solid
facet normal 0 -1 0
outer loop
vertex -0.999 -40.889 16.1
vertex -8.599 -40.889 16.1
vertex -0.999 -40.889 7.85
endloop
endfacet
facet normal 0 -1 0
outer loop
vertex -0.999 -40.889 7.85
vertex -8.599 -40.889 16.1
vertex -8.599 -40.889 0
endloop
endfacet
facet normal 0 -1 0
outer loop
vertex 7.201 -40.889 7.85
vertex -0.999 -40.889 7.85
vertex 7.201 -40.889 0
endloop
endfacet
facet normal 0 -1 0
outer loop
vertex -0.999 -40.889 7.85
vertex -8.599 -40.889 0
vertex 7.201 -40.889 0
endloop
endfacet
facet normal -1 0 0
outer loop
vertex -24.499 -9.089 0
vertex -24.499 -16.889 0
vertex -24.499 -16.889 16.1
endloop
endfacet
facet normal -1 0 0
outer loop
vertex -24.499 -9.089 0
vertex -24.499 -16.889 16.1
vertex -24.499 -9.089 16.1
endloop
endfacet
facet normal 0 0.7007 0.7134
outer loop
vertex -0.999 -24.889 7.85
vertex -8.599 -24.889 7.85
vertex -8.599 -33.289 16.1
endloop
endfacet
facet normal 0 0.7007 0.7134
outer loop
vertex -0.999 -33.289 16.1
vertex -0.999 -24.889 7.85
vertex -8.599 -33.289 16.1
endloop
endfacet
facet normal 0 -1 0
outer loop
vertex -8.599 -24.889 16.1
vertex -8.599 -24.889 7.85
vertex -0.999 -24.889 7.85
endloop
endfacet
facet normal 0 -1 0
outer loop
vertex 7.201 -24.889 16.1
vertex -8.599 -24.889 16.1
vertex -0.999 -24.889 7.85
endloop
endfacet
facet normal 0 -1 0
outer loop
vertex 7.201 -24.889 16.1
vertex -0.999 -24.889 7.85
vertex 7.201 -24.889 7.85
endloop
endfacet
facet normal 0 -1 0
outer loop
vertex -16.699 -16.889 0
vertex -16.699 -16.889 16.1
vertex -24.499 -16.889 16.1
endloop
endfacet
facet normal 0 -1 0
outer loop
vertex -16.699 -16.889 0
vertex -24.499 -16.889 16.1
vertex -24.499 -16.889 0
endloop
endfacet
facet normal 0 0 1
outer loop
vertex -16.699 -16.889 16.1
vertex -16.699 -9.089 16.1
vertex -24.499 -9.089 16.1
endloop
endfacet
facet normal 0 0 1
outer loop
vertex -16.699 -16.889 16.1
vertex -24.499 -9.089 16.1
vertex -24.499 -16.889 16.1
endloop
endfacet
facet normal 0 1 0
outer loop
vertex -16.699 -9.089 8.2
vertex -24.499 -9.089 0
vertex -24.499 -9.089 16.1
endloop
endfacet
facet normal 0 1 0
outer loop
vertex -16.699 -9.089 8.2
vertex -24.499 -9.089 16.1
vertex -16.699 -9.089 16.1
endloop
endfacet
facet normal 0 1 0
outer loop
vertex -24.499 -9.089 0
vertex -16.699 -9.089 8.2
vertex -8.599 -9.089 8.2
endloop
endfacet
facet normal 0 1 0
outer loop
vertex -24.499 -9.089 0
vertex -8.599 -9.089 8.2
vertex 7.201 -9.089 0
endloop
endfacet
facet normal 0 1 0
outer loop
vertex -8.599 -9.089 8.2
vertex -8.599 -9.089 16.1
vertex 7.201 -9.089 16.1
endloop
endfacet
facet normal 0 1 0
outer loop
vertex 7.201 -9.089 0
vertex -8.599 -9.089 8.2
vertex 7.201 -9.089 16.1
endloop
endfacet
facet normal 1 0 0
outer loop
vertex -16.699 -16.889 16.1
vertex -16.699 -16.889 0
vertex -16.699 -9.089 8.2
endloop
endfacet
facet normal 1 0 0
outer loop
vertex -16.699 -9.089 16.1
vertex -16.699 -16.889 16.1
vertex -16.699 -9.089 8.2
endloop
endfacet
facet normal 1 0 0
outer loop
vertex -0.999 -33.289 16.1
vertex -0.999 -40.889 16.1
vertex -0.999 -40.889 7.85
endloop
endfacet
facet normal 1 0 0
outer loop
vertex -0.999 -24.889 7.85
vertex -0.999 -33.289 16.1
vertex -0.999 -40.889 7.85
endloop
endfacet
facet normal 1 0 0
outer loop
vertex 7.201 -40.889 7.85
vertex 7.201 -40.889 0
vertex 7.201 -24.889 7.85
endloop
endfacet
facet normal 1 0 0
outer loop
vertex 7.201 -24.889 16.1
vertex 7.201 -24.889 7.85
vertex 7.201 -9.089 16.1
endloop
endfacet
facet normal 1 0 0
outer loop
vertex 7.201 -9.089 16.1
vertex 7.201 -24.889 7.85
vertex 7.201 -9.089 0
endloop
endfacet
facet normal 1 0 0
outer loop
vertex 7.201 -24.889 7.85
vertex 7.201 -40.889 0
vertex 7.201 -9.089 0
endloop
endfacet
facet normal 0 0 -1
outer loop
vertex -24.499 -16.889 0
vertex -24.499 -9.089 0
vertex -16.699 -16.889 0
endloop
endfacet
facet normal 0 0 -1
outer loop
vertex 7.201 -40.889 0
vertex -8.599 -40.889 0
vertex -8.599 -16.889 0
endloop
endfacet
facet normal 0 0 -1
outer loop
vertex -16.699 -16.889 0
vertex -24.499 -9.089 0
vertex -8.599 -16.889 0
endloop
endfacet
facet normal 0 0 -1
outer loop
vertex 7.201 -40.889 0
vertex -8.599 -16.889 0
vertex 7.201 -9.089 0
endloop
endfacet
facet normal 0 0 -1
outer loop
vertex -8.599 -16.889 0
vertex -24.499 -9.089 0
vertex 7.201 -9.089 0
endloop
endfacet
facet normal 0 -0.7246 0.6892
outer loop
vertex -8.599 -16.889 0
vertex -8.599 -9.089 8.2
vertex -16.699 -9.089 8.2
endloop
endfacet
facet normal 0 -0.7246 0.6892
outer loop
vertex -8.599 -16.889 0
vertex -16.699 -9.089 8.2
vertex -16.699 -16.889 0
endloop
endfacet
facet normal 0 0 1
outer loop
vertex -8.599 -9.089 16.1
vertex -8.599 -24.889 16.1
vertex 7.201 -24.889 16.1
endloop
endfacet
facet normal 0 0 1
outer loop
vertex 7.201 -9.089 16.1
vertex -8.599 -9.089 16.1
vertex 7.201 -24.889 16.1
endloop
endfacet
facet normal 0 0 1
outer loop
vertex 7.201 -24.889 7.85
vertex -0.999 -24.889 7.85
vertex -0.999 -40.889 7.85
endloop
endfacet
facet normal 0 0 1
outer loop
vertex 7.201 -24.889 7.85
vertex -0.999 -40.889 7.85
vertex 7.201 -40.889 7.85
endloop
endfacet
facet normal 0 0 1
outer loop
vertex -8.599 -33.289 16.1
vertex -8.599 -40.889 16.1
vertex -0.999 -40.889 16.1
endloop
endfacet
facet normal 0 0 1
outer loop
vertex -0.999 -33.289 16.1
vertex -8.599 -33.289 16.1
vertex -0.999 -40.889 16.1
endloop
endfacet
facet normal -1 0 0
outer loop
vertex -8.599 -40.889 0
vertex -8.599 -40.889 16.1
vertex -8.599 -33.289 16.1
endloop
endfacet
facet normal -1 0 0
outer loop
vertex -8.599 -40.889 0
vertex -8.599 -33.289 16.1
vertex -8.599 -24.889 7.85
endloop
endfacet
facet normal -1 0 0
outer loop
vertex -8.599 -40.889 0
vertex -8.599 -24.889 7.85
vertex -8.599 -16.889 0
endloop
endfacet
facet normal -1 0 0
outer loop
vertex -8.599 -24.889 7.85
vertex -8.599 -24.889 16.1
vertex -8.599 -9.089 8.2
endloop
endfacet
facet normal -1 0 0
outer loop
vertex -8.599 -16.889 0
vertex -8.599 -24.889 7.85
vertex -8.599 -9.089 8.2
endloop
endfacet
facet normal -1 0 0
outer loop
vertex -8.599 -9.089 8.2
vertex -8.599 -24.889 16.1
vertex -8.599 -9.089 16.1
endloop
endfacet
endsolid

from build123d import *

# Parameters (mm, degrees)
F0_W      = 15.8
F0_H      = 15.8
F1_DEPTH  = 16.1
F3_DEPTH  = 8.1
F5_DEPTH  = 7.8
F6_W      = 15.8
F6_H      = 16
F7_DEPTH  = 7.85
F8_W      = 7.6
F8_H      = 7.6
F9_DEPTH  = 8.25
F11_DEPTH = 7.6
F13_W     = 7.8
F13_H     = 7.8
F14_DEPTH = 25.4


with BuildPart() as f1:
    # F0 (on Top) → F1 (new body)
    with BuildSketch(Plane.XY):
        with Locations((-0.699278047, -1.1891025347)):
            Rectangle(F0_W, F0_H)
    extrude(amount=F1_DEPTH)

    # F2 (on face) → F3 (join)
    with BuildSketch(Plane(origin=(-8.599278047, 0, 0), x_dir=(0, -1, 0), z_dir=(-1, 0, 0))):
        Polygon((1.2891025347, 0), (9.0891025347, 0), (9.0891025347, 8.2), align=None)
    extrude(amount=F3_DEPTH)

    # F4 (on face) → F5 (join)
    with BuildSketch(Plane(origin=(-16.699278047, 0, 0), x_dir=(0, -1, 0), z_dir=(-1, 0, 0))):
        Polygon((1.2891025347, 16.1), (1.2891025347, 0), (9.0891025347, 8.2), (9.0891025347, 16.1), align=None)
        Polygon((1.2891025347, 0), (9.0891025347, 0), (9.0891025347, 8.2), align=None)
    extrude(amount=F5_DEPTH)

    # F6 (on face) → F7 (join)
    with BuildSketch(Plane(origin=(0, 0, 0), x_dir=(1, 0, 0), z_dir=(0, 0, -1))):
        with Locations((-0.699278047, -14.7108974653)):
            Rectangle(F6_W, F6_H)
    extrude(amount=-F7_DEPTH)

    # F8 (on face) → F9 (join, through all)
    with BuildSketch(Plane.XY.offset(7.85)):
        with Locations((-4.799278047, 18.9108974653)):
            Rectangle(F8_W, F8_H)
    extrude(amount=F9_DEPTH)

    # F10 (on face) → F11 (join, through all)
    with BuildSketch(Plane(origin=(-8.599278047, 0, 0), x_dir=(0, -1, 0), z_dir=(-1, 0, 0))):
        Polygon((-6.7108974653, 7.85), (-15.1108974653, 16.1), (-15.1108974653, 7.85), align=None)
    extrude(amount=-F11_DEPTH)

    # F12: F1 across face


with BuildPart() as f1_1:
    add(f1.part)
    add(f1.part.mirror(Plane(origin=(-8.0758652597, -9.0891025347, 7.462251893), x_dir=(1, 0, 0), z_dir=(0, -1, 0))))

    # F13 (on face) → F14 (cut)
    with BuildSketch(Plane.XY.offset(16.1)):
        with Locations((-20.599278047, -5.1891025347)):
            Rectangle(F13_W, F13_H)
        Polygon((-16.699278047, -1.2891025347), (-16.699278047, -9.0891025347), (7.200721953, -9.0891025347), (7.200721953, 22.7108974653), (-24.499278047, 22.7108974653), (-24.499278047, -1.2891025347), align=None)
    extrude(amount=-F14_DEPTH, mode=Mode.SUBTRACT)


solid = f1_1.part
